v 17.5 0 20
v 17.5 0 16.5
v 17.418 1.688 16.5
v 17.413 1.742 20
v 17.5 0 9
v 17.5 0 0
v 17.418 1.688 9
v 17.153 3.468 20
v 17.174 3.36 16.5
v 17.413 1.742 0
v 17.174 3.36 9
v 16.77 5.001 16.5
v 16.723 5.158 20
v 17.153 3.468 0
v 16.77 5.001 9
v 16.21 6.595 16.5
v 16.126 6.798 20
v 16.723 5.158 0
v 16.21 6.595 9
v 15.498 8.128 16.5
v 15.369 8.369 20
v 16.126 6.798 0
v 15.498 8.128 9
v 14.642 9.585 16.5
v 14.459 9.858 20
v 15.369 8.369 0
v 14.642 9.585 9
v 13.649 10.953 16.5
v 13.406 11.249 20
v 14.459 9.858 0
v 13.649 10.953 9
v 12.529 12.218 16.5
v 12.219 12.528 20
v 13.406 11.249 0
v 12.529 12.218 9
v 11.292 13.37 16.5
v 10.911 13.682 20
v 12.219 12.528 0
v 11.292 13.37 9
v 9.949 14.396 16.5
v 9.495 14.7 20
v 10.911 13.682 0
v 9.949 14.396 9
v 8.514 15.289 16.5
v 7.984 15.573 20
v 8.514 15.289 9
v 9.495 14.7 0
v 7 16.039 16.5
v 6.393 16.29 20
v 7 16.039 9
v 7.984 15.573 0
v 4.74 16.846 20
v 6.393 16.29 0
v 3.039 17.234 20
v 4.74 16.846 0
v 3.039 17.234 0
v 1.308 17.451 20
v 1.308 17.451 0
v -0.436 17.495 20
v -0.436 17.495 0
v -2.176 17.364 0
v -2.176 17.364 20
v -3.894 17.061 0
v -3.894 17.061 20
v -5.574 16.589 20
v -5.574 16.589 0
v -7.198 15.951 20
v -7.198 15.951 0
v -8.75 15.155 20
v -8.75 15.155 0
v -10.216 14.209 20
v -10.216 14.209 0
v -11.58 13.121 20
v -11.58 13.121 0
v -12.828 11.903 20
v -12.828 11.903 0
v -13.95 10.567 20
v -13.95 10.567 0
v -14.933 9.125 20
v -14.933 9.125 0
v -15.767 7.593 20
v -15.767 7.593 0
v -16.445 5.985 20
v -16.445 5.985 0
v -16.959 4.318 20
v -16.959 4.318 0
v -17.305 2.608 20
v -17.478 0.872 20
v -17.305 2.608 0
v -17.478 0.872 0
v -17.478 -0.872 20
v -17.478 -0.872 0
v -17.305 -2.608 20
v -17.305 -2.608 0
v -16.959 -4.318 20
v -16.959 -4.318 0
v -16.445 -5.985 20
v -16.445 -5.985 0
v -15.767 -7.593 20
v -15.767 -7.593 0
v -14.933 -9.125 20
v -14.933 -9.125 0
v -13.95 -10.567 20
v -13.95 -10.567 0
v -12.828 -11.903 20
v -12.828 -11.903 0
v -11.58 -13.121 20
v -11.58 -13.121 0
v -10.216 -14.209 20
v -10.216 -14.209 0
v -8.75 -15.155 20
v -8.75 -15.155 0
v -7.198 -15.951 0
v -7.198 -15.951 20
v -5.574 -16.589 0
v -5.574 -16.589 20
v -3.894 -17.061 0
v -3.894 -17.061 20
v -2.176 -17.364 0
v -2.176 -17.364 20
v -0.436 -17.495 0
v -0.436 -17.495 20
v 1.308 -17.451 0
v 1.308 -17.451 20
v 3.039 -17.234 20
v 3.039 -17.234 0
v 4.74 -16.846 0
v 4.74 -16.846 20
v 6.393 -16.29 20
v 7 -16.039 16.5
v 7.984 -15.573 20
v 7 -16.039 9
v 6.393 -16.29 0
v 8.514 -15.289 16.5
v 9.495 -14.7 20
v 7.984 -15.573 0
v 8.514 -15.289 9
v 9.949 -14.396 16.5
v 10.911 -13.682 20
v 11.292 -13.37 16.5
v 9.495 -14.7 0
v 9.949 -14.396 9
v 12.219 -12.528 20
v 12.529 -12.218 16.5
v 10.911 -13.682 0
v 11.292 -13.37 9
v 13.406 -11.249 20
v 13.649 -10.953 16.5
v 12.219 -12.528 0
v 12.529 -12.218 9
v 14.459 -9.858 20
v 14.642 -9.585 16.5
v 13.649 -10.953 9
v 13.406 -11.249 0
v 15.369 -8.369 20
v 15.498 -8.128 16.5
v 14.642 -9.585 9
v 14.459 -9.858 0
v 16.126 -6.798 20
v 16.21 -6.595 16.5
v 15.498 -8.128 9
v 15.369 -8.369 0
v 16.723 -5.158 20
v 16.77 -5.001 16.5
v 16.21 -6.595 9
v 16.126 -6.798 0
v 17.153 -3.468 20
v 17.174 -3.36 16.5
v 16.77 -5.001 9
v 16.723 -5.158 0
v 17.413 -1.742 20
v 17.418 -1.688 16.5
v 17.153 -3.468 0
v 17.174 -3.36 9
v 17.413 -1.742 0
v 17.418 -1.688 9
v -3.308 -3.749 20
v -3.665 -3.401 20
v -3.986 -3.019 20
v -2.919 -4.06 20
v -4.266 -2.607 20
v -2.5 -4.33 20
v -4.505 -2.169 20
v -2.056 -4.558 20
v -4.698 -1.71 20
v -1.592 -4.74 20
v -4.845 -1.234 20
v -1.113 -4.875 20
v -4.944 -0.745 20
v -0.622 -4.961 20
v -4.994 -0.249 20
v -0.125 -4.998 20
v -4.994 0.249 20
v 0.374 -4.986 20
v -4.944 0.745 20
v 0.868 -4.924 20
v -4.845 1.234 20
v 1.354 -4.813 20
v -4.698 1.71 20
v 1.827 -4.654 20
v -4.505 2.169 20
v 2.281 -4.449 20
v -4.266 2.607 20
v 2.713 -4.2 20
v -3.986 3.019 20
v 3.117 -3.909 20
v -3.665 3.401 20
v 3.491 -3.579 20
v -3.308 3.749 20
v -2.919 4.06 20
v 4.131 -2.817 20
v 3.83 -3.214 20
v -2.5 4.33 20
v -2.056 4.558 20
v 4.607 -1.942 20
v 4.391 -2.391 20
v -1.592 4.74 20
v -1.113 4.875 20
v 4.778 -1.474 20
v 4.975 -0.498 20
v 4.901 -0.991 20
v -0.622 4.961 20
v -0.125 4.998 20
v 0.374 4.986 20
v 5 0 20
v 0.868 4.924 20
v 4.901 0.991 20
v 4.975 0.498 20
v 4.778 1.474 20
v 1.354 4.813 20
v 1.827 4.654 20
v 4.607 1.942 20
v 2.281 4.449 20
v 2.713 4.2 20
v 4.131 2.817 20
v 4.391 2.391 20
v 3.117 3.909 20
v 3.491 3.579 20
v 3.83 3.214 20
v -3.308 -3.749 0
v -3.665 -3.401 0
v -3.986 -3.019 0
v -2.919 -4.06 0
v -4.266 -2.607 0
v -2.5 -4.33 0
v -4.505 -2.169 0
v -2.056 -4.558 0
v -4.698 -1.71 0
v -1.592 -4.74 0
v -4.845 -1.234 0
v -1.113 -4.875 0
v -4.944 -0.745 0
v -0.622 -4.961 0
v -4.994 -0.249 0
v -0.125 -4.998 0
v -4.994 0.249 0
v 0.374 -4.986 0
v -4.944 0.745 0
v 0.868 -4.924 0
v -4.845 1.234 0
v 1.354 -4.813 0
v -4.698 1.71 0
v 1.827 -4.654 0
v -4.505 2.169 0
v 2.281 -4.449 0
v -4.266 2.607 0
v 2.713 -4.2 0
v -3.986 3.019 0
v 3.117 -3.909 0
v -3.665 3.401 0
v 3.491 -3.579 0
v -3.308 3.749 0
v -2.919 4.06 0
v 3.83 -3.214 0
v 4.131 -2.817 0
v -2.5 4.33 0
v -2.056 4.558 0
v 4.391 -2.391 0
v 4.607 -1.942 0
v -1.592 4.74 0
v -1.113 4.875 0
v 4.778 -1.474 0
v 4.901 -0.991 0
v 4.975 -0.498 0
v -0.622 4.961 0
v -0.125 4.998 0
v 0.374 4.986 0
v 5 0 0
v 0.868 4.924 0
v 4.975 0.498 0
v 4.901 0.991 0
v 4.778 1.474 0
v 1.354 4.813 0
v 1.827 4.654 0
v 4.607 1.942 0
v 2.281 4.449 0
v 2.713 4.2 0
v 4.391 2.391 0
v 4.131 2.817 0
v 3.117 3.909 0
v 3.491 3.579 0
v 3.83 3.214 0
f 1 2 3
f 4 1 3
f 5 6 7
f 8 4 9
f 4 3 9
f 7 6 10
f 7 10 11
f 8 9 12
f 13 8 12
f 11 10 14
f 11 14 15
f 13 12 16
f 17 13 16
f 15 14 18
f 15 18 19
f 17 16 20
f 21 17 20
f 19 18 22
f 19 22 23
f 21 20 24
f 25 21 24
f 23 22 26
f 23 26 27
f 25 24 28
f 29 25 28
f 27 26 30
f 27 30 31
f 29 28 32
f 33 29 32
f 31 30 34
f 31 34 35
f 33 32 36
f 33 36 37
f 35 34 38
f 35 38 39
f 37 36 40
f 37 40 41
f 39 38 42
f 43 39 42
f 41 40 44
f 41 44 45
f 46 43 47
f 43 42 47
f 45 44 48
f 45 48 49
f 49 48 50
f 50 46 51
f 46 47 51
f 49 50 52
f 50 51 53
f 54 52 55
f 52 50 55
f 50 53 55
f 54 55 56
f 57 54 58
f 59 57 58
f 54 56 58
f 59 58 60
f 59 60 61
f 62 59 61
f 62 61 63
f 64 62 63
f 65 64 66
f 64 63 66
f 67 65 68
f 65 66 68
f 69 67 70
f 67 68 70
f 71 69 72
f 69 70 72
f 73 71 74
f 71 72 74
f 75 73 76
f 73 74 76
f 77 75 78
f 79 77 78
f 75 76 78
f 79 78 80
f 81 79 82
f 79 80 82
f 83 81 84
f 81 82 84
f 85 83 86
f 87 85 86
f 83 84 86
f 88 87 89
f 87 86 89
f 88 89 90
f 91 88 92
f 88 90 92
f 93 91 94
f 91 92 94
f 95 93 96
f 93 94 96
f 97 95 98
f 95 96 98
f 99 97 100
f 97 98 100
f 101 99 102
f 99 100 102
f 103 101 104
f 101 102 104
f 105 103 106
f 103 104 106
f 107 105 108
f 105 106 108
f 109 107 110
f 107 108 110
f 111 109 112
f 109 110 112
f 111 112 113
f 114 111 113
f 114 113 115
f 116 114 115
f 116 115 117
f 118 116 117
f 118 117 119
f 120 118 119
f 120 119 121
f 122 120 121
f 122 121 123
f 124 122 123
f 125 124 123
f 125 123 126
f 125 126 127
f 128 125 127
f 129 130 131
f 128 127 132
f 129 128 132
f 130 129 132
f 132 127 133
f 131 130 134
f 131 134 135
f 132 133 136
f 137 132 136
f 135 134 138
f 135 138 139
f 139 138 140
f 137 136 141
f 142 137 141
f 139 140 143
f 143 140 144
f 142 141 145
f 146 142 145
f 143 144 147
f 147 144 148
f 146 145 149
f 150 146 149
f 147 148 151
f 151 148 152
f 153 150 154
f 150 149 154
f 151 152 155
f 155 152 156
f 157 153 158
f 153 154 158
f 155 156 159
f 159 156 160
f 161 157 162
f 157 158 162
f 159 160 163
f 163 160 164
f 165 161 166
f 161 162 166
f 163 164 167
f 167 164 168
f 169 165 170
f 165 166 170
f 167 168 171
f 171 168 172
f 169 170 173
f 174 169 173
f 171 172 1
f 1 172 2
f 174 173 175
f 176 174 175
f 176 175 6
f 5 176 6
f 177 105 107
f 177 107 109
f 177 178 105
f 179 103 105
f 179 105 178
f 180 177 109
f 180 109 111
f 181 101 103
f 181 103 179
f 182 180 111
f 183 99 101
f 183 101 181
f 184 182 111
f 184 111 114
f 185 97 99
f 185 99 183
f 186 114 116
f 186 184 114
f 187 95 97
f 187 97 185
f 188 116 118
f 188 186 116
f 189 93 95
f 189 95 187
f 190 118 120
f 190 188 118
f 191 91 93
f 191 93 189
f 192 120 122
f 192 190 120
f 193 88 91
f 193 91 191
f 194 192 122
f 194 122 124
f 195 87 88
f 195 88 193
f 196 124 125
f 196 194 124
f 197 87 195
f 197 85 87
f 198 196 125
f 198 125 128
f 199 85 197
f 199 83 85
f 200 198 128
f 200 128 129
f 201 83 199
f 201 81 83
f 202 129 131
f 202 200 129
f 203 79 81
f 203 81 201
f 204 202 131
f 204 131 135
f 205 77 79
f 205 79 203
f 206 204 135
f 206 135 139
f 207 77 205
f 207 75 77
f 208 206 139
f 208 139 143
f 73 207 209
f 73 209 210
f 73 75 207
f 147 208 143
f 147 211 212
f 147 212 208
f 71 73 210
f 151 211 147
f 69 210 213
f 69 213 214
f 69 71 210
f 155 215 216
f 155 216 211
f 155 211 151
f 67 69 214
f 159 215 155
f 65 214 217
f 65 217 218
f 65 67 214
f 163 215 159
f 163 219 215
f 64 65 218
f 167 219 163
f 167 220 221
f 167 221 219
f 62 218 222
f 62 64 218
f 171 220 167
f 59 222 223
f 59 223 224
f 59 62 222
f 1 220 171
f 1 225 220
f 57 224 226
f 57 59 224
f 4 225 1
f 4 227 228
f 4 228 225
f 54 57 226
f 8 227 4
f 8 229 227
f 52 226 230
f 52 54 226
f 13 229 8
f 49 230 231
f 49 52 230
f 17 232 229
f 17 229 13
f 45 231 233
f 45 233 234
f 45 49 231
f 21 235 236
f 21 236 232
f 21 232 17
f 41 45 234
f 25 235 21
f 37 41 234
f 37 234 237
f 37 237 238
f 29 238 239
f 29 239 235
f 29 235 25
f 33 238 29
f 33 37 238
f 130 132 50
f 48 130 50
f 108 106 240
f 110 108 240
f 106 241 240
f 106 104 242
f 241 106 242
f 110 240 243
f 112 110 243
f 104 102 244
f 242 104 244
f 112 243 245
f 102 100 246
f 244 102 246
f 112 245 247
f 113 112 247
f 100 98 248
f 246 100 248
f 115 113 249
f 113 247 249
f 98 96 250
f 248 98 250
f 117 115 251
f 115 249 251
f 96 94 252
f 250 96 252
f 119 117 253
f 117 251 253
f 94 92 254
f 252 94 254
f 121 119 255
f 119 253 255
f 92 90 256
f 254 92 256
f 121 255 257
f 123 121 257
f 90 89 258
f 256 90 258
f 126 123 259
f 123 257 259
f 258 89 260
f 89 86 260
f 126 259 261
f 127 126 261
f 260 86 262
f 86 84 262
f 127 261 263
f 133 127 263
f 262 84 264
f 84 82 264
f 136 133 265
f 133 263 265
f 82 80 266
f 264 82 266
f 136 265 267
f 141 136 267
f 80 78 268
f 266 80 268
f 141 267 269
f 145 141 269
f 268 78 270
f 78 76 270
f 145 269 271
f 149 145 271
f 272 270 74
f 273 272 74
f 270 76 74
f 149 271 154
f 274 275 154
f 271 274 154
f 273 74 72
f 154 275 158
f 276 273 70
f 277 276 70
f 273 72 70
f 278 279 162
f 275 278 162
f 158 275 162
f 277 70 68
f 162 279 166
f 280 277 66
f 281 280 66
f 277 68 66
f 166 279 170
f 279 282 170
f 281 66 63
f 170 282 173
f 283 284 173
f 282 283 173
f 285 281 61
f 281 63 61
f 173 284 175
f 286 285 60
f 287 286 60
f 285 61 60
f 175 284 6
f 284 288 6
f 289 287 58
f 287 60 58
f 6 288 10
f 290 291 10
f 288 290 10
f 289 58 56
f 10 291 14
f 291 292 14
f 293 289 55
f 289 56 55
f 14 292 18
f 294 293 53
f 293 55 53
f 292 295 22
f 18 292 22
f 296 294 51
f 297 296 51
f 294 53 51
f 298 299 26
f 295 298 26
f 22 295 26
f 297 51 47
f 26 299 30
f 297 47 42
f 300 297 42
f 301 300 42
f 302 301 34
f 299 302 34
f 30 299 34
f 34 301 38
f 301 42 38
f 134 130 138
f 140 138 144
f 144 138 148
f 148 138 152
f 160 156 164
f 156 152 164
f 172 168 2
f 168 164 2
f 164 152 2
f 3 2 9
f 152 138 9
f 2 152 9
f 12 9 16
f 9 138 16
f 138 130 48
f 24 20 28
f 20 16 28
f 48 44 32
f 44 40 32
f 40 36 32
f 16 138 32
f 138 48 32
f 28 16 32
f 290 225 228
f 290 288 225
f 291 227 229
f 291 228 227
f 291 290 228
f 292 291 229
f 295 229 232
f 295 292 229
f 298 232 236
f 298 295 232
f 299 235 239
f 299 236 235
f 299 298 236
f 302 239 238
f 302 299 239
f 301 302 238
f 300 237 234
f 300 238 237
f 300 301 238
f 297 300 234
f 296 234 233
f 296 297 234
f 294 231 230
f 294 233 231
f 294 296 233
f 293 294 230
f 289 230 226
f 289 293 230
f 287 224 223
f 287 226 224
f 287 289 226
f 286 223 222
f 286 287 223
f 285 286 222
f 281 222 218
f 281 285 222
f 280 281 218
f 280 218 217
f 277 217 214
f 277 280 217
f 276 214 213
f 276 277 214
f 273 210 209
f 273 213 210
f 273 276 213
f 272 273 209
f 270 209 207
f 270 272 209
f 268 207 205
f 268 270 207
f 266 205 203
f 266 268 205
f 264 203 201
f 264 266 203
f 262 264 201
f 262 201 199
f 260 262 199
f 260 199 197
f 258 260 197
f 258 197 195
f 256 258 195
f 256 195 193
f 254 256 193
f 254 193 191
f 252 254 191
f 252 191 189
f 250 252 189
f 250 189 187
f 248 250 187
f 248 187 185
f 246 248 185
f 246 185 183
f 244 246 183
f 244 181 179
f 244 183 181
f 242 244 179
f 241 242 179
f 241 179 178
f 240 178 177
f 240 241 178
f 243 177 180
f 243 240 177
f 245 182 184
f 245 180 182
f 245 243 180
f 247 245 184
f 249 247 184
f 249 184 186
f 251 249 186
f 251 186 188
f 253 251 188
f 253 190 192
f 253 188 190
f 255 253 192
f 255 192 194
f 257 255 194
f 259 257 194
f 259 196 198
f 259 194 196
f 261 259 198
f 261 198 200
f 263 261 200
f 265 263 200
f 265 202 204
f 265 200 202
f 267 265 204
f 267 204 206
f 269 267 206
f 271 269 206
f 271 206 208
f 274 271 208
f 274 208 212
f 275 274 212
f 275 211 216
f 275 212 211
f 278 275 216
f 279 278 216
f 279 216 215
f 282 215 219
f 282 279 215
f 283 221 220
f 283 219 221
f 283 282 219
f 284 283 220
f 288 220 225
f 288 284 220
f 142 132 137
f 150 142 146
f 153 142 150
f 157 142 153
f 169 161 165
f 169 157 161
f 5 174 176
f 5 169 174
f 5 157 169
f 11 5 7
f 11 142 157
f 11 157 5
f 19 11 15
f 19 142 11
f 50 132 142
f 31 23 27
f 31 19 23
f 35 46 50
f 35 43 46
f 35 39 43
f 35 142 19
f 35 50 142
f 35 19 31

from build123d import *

# Parameters (mm, degrees)
BOX001_W          = 30
BOX001_H          = 70
BOX001_DEPTH      = 7.5
CYLINDER003_R     = 5
CYLINDER003_DEPTH = 40
CYLINDER002_R     = 17.5
CYLINDER002_DEPTH = 20


with BuildPart() as cube001:
    # Box001 → Box001 (new body)
    with BuildSketch(Plane(origin=(7, -20, 9), x_dir=(1, 0, 0), z_dir=(0, 0, 1))):
        with Locations((15, 35)):
            Rectangle(BOX001_W, BOX001_H)
    extrude(amount=BOX001_DEPTH)


with BuildPart() as cylinder003:
    # Cylinder003 → Cylinder003 (new body)
    with BuildSketch(Plane.XY.offset(-10)):
        Circle(CYLINDER003_R)
    extrude(amount=CYLINDER003_DEPTH)


with BuildPart() as mount_top:
    # Cylinder002 → Cylinder002 (new body)
    with BuildSketch(Plane.XY):
        Circle(CYLINDER002_R)
    extrude(amount=CYLINDER002_DEPTH)

    # Cut002: cut Cylinder003
    add(cylinder003.part, mode=Mode.SUBTRACT)

    # Cut003: cut Cube001
    add(cube001.part, mode=Mode.SUBTRACT)


solid = mount_top.part
